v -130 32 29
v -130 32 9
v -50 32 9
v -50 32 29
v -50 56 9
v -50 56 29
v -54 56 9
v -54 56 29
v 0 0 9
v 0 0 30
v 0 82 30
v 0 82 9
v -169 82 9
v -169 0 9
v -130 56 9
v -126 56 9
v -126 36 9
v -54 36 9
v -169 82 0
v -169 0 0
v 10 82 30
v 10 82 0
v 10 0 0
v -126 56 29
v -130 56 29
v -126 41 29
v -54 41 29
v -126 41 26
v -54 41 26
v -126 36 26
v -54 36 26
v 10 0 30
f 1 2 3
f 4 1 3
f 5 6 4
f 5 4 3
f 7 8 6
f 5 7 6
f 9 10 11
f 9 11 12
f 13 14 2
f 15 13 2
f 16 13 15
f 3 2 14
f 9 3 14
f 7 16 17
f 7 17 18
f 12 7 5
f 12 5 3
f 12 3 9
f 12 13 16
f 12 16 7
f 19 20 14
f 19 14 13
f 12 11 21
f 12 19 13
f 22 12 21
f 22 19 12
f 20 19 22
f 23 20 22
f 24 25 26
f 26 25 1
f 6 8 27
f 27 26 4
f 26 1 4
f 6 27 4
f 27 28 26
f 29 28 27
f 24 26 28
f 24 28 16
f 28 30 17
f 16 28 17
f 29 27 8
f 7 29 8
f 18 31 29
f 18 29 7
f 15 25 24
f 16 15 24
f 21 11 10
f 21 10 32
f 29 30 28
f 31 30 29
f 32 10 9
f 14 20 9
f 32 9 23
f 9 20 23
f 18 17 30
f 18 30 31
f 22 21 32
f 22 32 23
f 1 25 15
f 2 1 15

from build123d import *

# Parameters (mm, degrees)
ESQUISSE1_W        = 169
ESQUISSE1_H        = 82
BOSS_EXTRU_1_DEPTH = 9
ESQUISSE2_W        = 10
ESQUISSE2_H        = 30
BOSS_EXTRU_2_DEPTH = 82
ESQUISSE3_W        = 80
ESQUISSE3_H        = 4
BOSS_EXTRU_4_DEPTH = 20
ESQUISSE4_W        = 4
ESQUISSE4_H        = 20
BOSS_EXTRU_5_DEPTH = 20
ESQUISSE5_W        = 4
ESQUISSE5_H        = 20
BOSS_EXTRU_6_DEPTH = 20
ESQUISSE6_W        = 72
ESQUISSE6_H        = 3
BOSS_EXTRU_7_DEPTH = 5


with BuildPart() as part:
    # Esquisse1 → Boss.-Extru.1 (new body)
    with BuildSketch(Plane.XY):
        with Locations((-84.5, 41)):
            Rectangle(ESQUISSE1_W, ESQUISSE1_H)
    extrude(amount=BOSS_EXTRU_1_DEPTH)

    # Esquisse2 → Boss.-Extru.2 (add)
    with BuildSketch(Plane(origin=(0, 82, 0), x_dir=(1, 0, 0), z_dir=(0, 1, 0))):
        with Locations((5, -15)):
            Rectangle(ESQUISSE2_W, ESQUISSE2_H)
    extrude(amount=-BOSS_EXTRU_2_DEPTH)

    # Esquisse3 → Boss.-Extru.4 (add)
    with BuildSketch(Plane.XY.offset(9)):
        with Locations((-90, 34)):
            Rectangle(ESQUISSE3_W, ESQUISSE3_H)
    extrude(amount=BOSS_EXTRU_4_DEPTH)

    # Esquisse4 → Boss.-Extru.5 (add)
    with BuildSketch(Plane(origin=(0, 36, 0), x_dir=(1, 0, 0), z_dir=(0, 1, 0))):
        with Locations((-52, -19)):
            Rectangle(ESQUISSE4_W, ESQUISSE4_H)
    extrude(amount=BOSS_EXTRU_5_DEPTH)

    # Esquisse5 → Boss.-Extru.6 (add)
    with BuildSketch(Plane(origin=(0, 36, 0), x_dir=(1, 0, 0), z_dir=(0, 1, 0))):
        with Locations((-128, -19)):
            Rectangle(ESQUISSE5_W, ESQUISSE5_H)
    extrude(amount=BOSS_EXTRU_6_DEPTH)

    # Esquisse6 → Boss.-Extru.7 (add)
    with BuildSketch(Plane(origin=(0, 36, 0), x_dir=(1, 0, 0), z_dir=(0, 1, 0))):
        with Locations((-90, -27.5)):
            Rectangle(ESQUISSE6_W, ESQUISSE6_H)
    extrude(amount=BOSS_EXTRU_7_DEPTH)


solid = part.part
